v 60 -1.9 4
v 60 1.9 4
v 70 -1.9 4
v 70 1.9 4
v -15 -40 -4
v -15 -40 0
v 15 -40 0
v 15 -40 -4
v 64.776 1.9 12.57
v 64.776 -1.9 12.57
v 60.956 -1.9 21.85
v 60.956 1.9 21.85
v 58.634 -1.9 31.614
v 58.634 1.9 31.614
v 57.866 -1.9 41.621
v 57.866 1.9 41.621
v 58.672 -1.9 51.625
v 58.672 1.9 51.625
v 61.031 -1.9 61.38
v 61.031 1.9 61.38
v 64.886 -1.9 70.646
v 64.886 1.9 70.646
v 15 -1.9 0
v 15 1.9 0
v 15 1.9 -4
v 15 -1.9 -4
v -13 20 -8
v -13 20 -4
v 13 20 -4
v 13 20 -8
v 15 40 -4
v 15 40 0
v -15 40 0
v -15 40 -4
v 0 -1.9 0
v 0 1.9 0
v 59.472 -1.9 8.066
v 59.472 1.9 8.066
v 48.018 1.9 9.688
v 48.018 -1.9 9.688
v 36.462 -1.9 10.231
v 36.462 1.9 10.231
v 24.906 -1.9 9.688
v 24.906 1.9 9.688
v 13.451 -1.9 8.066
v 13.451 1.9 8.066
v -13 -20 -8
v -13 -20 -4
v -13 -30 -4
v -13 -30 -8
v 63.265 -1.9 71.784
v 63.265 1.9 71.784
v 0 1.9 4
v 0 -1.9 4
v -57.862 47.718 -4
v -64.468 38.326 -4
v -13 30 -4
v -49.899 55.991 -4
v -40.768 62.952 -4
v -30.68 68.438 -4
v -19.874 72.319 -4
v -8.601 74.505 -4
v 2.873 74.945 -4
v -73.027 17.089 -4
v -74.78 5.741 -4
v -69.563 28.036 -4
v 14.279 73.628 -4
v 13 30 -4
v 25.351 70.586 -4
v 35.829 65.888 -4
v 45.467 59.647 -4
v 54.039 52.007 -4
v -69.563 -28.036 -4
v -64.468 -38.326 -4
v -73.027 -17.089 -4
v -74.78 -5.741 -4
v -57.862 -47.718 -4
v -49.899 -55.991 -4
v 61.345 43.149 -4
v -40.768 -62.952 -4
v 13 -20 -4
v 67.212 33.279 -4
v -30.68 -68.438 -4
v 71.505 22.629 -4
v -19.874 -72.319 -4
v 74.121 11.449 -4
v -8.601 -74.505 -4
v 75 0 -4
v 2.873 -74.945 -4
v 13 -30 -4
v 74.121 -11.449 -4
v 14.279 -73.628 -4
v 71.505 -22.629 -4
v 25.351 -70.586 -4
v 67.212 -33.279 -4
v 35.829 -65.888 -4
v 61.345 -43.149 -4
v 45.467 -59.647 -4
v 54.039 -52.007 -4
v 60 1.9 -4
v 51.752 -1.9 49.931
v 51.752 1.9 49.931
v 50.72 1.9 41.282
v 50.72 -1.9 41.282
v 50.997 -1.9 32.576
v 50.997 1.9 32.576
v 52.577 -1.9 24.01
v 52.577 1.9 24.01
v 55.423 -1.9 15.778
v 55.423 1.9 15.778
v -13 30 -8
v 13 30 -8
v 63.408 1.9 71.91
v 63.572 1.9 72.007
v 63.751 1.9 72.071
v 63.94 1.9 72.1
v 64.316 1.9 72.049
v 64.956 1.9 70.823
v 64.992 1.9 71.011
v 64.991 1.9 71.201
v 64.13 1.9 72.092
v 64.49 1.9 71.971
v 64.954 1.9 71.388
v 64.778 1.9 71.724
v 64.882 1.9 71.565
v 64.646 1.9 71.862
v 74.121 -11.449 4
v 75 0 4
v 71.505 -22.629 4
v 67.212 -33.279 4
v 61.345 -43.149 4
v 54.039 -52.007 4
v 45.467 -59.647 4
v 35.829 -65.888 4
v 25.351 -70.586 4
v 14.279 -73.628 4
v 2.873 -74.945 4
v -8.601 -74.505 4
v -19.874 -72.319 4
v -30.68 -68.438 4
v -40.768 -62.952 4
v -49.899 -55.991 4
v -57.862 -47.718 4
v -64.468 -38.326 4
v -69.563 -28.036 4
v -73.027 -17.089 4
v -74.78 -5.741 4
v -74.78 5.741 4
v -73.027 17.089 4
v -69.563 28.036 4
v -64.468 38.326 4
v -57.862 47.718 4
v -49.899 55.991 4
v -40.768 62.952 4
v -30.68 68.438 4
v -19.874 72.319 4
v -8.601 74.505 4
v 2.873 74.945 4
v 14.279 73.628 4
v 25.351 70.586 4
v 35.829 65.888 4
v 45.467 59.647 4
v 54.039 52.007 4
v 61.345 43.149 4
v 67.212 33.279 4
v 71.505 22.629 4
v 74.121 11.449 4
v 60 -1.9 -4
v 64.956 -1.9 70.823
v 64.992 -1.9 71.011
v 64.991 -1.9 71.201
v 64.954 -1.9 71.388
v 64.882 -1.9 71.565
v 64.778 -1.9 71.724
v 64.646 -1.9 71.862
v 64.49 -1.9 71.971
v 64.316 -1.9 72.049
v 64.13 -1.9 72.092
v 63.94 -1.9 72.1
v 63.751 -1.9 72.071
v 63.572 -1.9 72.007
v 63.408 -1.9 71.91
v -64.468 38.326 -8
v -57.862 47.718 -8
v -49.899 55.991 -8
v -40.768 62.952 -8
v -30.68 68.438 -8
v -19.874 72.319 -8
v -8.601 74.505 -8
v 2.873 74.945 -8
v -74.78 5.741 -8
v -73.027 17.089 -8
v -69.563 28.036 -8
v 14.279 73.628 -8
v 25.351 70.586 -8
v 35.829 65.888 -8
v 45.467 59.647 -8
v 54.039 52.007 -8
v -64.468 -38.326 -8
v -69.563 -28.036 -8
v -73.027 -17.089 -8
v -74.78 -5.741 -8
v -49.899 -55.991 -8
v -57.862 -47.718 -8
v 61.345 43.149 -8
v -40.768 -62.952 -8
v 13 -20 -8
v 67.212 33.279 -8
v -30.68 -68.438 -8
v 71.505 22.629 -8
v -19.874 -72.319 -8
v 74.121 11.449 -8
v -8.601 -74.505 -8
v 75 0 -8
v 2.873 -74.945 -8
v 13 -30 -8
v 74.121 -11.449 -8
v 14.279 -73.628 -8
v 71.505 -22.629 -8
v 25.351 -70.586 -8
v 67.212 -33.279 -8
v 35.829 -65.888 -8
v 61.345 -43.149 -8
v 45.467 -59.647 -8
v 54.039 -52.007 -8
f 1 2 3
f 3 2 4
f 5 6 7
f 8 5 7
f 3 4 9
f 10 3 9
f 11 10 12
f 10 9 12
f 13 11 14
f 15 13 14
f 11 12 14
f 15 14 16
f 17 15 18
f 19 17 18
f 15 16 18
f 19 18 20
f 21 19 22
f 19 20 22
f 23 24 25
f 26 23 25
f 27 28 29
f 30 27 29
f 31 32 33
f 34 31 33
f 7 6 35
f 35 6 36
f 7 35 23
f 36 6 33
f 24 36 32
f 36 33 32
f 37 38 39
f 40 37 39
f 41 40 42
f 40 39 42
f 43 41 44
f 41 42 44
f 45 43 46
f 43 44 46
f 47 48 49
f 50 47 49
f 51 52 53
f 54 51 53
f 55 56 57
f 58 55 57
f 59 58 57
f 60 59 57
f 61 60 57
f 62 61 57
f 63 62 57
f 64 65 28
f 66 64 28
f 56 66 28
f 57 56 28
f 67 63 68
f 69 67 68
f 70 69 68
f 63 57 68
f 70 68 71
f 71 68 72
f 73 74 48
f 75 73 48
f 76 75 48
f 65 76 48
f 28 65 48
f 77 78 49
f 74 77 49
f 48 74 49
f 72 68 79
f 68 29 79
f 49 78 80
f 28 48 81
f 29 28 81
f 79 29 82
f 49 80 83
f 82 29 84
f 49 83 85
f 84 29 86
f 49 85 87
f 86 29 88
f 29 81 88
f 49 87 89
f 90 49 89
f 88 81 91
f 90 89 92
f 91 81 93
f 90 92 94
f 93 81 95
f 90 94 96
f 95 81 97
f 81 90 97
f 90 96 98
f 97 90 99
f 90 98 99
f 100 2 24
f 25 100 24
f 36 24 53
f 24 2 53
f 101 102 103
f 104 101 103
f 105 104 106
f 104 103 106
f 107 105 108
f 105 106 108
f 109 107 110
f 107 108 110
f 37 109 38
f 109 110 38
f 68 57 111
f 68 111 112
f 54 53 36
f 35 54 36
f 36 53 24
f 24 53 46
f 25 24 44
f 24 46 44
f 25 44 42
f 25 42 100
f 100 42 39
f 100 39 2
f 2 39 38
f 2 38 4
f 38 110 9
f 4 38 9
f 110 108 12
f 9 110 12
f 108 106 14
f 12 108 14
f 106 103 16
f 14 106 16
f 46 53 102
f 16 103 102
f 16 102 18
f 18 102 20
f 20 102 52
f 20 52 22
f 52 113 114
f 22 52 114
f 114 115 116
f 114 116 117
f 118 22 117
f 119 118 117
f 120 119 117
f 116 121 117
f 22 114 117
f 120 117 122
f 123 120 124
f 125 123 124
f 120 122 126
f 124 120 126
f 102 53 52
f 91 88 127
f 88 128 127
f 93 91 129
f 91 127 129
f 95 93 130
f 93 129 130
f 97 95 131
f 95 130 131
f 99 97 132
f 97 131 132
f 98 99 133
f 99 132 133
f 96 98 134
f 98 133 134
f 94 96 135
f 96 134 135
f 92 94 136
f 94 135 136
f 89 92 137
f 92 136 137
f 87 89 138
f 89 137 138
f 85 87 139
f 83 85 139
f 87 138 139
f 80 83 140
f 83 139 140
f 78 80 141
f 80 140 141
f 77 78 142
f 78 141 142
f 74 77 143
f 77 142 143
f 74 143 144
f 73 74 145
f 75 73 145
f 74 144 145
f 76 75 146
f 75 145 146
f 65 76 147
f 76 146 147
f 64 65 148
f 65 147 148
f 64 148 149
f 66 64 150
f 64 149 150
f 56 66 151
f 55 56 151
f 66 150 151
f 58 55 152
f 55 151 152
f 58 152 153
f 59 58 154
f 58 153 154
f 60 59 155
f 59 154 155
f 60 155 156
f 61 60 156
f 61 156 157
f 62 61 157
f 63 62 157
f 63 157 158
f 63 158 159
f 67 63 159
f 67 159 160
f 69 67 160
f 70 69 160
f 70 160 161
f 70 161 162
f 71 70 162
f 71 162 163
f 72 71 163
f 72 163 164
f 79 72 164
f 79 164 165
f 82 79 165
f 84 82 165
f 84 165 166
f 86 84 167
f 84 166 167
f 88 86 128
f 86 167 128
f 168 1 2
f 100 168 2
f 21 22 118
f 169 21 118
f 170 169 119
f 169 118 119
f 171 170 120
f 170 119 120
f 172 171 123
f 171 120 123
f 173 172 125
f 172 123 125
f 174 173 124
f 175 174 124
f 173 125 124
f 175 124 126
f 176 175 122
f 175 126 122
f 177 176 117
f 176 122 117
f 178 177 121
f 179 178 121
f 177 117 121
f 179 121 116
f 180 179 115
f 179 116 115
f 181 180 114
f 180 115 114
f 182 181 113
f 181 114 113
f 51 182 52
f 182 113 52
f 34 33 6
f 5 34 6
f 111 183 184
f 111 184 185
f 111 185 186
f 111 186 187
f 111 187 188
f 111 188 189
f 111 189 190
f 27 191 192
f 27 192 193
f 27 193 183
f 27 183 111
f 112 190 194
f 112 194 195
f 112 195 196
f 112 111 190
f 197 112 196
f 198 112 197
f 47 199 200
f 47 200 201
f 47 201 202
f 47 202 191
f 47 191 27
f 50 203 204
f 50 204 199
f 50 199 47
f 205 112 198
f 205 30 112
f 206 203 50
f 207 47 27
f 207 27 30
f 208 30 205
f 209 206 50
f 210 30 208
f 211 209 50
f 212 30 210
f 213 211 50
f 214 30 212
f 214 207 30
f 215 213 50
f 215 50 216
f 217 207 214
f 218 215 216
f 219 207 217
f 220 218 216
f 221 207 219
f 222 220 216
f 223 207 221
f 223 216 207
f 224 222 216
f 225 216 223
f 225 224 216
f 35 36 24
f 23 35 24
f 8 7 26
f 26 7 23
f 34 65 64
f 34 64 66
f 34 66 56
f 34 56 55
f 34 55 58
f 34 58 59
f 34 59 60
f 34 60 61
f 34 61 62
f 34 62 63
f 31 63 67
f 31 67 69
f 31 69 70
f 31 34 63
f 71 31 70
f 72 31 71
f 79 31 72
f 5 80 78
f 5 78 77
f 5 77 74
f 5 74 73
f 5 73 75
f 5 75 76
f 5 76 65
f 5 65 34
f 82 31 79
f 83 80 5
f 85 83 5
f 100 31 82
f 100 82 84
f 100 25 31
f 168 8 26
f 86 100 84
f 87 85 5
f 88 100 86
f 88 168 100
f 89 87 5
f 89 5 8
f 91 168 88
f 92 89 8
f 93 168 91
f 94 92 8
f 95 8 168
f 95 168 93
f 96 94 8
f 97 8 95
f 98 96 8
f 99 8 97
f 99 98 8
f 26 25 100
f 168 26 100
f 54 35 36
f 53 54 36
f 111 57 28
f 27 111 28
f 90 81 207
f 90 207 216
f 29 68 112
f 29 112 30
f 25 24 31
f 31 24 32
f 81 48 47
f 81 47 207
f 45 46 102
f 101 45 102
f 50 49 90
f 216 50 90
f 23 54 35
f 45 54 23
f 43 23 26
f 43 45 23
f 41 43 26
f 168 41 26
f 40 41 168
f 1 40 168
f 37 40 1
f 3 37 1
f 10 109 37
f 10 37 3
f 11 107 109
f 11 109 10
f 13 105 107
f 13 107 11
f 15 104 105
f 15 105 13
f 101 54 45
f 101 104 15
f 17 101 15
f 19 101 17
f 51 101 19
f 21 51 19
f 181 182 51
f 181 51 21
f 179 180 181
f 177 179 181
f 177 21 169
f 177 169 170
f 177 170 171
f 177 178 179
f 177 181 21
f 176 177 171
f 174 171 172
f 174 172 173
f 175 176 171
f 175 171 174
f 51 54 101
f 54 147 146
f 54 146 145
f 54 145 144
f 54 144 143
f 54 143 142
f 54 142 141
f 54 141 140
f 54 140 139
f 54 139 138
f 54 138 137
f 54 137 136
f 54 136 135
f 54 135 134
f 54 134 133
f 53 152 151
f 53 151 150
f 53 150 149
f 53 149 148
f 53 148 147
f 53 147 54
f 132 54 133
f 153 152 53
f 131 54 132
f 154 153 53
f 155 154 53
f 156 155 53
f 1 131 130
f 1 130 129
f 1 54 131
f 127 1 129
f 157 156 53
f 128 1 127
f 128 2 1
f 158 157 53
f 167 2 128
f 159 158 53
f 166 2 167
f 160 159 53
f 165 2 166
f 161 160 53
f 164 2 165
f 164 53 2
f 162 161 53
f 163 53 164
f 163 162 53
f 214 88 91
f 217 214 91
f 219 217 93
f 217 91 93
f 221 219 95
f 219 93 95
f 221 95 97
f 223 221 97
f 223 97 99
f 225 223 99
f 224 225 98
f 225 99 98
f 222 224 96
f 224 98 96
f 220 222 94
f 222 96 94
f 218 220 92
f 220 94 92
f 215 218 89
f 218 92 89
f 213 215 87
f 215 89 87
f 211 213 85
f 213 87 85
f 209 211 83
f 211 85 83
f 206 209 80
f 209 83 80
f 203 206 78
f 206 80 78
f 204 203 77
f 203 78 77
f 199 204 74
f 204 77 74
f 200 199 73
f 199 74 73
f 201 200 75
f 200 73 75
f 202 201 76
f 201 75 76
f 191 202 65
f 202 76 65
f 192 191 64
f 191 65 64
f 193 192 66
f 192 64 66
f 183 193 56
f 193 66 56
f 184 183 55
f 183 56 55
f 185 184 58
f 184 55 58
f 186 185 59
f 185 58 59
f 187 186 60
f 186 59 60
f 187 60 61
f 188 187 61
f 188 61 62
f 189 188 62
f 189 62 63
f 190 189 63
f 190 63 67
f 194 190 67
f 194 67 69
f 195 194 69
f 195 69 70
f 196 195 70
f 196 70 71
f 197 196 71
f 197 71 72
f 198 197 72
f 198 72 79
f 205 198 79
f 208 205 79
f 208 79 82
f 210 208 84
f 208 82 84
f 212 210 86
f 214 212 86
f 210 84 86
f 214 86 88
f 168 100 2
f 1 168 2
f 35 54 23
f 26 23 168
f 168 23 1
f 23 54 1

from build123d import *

# Parameters (mm, degrees)
F0_R     = 75
F0_W     = 60
F0_H     = 3.8
F1_DEPTH = 4
F2_R     = 75
F3_DEPTH = 4
F4_R     = 75
F4_W     = 26
F4_H     = 10
F5_DEPTH = 4
F7_DEPTH = 3.8


with BuildPart() as f1:
    # F0 (on Top) → F1 (new body)
    with BuildSketch(Plane.XY):
        Circle(F0_R)
        with Locations((30, 0)):
            Rectangle(F0_W, F0_H, mode=Mode.SUBTRACT)
    extrude(amount=F1_DEPTH)

    # F2 (on face) → F3 (join)
    with BuildSketch(Plane(origin=(0, 0, 0), x_dir=(1, 0, 0), z_dir=(0, 0, -1))):
        Circle(F2_R)
        Polygon((15, 40), (15, 1.9), (60, 1.9), (60, -1.9), (15, -1.9), (15, -40), (-15, -40), (-15, 40), align=None, mode=Mode.SUBTRACT)
    extrude(amount=F3_DEPTH)


with BuildPart() as f5:
    # F4 (on face) → F5 (new body)
    with BuildSketch(Plane(origin=(0, 0, -4), x_dir=(1, 0, 0), z_dir=(0, 0, -1))):
        Circle(F4_R)
        with Locations((0, -25)):
            Rectangle(F4_W, F4_H, mode=Mode.SUBTRACT)
        with Locations((0, 25)):
            Rectangle(F4_W, F4_H, mode=Mode.SUBTRACT)
    extrude(amount=F5_DEPTH)


with BuildPart() as f7:
    # F6 (on face) → F7 (new body)
    with BuildSketch(Plane.XZ.offset(-1.9)):
        with BuildLine():
            Line((0, 4), (0, 0))
            Line((0, 0), (15, 0))
            Line((15, 0), (15, -4))
            Line((15, -4), (60, -4))
            Line((60, -4), (60, 4))
            Line((60, 4), (70, 4))
            ThreePointArc((70, 4), (58.053621, 36.6026), (64.886219, 70.646118))
            ThreePointArc((64.886219, 70.646118), (64.570248, 71.92003), (63.264831, 71.783747))
            Line((63.264831, 71.783747), (0, 4))
        make_face()
        with BuildLine():
            Line((13.451046, 8.066386), (51.752388, 49.930651))
            ThreePointArc((51.752388, 49.930651), (51.625796, 28.263434), (59.472039, 8.066386))
            ThreePointArc((59.472039, 8.066386), (36.461543, 10.230592), (13.451046, 8.066386))
        make_face(mode=Mode.SUBTRACT)
    extrude(amount=F7_DEPTH)


solid = Compound([f1.part, f5.part, f7.part])
